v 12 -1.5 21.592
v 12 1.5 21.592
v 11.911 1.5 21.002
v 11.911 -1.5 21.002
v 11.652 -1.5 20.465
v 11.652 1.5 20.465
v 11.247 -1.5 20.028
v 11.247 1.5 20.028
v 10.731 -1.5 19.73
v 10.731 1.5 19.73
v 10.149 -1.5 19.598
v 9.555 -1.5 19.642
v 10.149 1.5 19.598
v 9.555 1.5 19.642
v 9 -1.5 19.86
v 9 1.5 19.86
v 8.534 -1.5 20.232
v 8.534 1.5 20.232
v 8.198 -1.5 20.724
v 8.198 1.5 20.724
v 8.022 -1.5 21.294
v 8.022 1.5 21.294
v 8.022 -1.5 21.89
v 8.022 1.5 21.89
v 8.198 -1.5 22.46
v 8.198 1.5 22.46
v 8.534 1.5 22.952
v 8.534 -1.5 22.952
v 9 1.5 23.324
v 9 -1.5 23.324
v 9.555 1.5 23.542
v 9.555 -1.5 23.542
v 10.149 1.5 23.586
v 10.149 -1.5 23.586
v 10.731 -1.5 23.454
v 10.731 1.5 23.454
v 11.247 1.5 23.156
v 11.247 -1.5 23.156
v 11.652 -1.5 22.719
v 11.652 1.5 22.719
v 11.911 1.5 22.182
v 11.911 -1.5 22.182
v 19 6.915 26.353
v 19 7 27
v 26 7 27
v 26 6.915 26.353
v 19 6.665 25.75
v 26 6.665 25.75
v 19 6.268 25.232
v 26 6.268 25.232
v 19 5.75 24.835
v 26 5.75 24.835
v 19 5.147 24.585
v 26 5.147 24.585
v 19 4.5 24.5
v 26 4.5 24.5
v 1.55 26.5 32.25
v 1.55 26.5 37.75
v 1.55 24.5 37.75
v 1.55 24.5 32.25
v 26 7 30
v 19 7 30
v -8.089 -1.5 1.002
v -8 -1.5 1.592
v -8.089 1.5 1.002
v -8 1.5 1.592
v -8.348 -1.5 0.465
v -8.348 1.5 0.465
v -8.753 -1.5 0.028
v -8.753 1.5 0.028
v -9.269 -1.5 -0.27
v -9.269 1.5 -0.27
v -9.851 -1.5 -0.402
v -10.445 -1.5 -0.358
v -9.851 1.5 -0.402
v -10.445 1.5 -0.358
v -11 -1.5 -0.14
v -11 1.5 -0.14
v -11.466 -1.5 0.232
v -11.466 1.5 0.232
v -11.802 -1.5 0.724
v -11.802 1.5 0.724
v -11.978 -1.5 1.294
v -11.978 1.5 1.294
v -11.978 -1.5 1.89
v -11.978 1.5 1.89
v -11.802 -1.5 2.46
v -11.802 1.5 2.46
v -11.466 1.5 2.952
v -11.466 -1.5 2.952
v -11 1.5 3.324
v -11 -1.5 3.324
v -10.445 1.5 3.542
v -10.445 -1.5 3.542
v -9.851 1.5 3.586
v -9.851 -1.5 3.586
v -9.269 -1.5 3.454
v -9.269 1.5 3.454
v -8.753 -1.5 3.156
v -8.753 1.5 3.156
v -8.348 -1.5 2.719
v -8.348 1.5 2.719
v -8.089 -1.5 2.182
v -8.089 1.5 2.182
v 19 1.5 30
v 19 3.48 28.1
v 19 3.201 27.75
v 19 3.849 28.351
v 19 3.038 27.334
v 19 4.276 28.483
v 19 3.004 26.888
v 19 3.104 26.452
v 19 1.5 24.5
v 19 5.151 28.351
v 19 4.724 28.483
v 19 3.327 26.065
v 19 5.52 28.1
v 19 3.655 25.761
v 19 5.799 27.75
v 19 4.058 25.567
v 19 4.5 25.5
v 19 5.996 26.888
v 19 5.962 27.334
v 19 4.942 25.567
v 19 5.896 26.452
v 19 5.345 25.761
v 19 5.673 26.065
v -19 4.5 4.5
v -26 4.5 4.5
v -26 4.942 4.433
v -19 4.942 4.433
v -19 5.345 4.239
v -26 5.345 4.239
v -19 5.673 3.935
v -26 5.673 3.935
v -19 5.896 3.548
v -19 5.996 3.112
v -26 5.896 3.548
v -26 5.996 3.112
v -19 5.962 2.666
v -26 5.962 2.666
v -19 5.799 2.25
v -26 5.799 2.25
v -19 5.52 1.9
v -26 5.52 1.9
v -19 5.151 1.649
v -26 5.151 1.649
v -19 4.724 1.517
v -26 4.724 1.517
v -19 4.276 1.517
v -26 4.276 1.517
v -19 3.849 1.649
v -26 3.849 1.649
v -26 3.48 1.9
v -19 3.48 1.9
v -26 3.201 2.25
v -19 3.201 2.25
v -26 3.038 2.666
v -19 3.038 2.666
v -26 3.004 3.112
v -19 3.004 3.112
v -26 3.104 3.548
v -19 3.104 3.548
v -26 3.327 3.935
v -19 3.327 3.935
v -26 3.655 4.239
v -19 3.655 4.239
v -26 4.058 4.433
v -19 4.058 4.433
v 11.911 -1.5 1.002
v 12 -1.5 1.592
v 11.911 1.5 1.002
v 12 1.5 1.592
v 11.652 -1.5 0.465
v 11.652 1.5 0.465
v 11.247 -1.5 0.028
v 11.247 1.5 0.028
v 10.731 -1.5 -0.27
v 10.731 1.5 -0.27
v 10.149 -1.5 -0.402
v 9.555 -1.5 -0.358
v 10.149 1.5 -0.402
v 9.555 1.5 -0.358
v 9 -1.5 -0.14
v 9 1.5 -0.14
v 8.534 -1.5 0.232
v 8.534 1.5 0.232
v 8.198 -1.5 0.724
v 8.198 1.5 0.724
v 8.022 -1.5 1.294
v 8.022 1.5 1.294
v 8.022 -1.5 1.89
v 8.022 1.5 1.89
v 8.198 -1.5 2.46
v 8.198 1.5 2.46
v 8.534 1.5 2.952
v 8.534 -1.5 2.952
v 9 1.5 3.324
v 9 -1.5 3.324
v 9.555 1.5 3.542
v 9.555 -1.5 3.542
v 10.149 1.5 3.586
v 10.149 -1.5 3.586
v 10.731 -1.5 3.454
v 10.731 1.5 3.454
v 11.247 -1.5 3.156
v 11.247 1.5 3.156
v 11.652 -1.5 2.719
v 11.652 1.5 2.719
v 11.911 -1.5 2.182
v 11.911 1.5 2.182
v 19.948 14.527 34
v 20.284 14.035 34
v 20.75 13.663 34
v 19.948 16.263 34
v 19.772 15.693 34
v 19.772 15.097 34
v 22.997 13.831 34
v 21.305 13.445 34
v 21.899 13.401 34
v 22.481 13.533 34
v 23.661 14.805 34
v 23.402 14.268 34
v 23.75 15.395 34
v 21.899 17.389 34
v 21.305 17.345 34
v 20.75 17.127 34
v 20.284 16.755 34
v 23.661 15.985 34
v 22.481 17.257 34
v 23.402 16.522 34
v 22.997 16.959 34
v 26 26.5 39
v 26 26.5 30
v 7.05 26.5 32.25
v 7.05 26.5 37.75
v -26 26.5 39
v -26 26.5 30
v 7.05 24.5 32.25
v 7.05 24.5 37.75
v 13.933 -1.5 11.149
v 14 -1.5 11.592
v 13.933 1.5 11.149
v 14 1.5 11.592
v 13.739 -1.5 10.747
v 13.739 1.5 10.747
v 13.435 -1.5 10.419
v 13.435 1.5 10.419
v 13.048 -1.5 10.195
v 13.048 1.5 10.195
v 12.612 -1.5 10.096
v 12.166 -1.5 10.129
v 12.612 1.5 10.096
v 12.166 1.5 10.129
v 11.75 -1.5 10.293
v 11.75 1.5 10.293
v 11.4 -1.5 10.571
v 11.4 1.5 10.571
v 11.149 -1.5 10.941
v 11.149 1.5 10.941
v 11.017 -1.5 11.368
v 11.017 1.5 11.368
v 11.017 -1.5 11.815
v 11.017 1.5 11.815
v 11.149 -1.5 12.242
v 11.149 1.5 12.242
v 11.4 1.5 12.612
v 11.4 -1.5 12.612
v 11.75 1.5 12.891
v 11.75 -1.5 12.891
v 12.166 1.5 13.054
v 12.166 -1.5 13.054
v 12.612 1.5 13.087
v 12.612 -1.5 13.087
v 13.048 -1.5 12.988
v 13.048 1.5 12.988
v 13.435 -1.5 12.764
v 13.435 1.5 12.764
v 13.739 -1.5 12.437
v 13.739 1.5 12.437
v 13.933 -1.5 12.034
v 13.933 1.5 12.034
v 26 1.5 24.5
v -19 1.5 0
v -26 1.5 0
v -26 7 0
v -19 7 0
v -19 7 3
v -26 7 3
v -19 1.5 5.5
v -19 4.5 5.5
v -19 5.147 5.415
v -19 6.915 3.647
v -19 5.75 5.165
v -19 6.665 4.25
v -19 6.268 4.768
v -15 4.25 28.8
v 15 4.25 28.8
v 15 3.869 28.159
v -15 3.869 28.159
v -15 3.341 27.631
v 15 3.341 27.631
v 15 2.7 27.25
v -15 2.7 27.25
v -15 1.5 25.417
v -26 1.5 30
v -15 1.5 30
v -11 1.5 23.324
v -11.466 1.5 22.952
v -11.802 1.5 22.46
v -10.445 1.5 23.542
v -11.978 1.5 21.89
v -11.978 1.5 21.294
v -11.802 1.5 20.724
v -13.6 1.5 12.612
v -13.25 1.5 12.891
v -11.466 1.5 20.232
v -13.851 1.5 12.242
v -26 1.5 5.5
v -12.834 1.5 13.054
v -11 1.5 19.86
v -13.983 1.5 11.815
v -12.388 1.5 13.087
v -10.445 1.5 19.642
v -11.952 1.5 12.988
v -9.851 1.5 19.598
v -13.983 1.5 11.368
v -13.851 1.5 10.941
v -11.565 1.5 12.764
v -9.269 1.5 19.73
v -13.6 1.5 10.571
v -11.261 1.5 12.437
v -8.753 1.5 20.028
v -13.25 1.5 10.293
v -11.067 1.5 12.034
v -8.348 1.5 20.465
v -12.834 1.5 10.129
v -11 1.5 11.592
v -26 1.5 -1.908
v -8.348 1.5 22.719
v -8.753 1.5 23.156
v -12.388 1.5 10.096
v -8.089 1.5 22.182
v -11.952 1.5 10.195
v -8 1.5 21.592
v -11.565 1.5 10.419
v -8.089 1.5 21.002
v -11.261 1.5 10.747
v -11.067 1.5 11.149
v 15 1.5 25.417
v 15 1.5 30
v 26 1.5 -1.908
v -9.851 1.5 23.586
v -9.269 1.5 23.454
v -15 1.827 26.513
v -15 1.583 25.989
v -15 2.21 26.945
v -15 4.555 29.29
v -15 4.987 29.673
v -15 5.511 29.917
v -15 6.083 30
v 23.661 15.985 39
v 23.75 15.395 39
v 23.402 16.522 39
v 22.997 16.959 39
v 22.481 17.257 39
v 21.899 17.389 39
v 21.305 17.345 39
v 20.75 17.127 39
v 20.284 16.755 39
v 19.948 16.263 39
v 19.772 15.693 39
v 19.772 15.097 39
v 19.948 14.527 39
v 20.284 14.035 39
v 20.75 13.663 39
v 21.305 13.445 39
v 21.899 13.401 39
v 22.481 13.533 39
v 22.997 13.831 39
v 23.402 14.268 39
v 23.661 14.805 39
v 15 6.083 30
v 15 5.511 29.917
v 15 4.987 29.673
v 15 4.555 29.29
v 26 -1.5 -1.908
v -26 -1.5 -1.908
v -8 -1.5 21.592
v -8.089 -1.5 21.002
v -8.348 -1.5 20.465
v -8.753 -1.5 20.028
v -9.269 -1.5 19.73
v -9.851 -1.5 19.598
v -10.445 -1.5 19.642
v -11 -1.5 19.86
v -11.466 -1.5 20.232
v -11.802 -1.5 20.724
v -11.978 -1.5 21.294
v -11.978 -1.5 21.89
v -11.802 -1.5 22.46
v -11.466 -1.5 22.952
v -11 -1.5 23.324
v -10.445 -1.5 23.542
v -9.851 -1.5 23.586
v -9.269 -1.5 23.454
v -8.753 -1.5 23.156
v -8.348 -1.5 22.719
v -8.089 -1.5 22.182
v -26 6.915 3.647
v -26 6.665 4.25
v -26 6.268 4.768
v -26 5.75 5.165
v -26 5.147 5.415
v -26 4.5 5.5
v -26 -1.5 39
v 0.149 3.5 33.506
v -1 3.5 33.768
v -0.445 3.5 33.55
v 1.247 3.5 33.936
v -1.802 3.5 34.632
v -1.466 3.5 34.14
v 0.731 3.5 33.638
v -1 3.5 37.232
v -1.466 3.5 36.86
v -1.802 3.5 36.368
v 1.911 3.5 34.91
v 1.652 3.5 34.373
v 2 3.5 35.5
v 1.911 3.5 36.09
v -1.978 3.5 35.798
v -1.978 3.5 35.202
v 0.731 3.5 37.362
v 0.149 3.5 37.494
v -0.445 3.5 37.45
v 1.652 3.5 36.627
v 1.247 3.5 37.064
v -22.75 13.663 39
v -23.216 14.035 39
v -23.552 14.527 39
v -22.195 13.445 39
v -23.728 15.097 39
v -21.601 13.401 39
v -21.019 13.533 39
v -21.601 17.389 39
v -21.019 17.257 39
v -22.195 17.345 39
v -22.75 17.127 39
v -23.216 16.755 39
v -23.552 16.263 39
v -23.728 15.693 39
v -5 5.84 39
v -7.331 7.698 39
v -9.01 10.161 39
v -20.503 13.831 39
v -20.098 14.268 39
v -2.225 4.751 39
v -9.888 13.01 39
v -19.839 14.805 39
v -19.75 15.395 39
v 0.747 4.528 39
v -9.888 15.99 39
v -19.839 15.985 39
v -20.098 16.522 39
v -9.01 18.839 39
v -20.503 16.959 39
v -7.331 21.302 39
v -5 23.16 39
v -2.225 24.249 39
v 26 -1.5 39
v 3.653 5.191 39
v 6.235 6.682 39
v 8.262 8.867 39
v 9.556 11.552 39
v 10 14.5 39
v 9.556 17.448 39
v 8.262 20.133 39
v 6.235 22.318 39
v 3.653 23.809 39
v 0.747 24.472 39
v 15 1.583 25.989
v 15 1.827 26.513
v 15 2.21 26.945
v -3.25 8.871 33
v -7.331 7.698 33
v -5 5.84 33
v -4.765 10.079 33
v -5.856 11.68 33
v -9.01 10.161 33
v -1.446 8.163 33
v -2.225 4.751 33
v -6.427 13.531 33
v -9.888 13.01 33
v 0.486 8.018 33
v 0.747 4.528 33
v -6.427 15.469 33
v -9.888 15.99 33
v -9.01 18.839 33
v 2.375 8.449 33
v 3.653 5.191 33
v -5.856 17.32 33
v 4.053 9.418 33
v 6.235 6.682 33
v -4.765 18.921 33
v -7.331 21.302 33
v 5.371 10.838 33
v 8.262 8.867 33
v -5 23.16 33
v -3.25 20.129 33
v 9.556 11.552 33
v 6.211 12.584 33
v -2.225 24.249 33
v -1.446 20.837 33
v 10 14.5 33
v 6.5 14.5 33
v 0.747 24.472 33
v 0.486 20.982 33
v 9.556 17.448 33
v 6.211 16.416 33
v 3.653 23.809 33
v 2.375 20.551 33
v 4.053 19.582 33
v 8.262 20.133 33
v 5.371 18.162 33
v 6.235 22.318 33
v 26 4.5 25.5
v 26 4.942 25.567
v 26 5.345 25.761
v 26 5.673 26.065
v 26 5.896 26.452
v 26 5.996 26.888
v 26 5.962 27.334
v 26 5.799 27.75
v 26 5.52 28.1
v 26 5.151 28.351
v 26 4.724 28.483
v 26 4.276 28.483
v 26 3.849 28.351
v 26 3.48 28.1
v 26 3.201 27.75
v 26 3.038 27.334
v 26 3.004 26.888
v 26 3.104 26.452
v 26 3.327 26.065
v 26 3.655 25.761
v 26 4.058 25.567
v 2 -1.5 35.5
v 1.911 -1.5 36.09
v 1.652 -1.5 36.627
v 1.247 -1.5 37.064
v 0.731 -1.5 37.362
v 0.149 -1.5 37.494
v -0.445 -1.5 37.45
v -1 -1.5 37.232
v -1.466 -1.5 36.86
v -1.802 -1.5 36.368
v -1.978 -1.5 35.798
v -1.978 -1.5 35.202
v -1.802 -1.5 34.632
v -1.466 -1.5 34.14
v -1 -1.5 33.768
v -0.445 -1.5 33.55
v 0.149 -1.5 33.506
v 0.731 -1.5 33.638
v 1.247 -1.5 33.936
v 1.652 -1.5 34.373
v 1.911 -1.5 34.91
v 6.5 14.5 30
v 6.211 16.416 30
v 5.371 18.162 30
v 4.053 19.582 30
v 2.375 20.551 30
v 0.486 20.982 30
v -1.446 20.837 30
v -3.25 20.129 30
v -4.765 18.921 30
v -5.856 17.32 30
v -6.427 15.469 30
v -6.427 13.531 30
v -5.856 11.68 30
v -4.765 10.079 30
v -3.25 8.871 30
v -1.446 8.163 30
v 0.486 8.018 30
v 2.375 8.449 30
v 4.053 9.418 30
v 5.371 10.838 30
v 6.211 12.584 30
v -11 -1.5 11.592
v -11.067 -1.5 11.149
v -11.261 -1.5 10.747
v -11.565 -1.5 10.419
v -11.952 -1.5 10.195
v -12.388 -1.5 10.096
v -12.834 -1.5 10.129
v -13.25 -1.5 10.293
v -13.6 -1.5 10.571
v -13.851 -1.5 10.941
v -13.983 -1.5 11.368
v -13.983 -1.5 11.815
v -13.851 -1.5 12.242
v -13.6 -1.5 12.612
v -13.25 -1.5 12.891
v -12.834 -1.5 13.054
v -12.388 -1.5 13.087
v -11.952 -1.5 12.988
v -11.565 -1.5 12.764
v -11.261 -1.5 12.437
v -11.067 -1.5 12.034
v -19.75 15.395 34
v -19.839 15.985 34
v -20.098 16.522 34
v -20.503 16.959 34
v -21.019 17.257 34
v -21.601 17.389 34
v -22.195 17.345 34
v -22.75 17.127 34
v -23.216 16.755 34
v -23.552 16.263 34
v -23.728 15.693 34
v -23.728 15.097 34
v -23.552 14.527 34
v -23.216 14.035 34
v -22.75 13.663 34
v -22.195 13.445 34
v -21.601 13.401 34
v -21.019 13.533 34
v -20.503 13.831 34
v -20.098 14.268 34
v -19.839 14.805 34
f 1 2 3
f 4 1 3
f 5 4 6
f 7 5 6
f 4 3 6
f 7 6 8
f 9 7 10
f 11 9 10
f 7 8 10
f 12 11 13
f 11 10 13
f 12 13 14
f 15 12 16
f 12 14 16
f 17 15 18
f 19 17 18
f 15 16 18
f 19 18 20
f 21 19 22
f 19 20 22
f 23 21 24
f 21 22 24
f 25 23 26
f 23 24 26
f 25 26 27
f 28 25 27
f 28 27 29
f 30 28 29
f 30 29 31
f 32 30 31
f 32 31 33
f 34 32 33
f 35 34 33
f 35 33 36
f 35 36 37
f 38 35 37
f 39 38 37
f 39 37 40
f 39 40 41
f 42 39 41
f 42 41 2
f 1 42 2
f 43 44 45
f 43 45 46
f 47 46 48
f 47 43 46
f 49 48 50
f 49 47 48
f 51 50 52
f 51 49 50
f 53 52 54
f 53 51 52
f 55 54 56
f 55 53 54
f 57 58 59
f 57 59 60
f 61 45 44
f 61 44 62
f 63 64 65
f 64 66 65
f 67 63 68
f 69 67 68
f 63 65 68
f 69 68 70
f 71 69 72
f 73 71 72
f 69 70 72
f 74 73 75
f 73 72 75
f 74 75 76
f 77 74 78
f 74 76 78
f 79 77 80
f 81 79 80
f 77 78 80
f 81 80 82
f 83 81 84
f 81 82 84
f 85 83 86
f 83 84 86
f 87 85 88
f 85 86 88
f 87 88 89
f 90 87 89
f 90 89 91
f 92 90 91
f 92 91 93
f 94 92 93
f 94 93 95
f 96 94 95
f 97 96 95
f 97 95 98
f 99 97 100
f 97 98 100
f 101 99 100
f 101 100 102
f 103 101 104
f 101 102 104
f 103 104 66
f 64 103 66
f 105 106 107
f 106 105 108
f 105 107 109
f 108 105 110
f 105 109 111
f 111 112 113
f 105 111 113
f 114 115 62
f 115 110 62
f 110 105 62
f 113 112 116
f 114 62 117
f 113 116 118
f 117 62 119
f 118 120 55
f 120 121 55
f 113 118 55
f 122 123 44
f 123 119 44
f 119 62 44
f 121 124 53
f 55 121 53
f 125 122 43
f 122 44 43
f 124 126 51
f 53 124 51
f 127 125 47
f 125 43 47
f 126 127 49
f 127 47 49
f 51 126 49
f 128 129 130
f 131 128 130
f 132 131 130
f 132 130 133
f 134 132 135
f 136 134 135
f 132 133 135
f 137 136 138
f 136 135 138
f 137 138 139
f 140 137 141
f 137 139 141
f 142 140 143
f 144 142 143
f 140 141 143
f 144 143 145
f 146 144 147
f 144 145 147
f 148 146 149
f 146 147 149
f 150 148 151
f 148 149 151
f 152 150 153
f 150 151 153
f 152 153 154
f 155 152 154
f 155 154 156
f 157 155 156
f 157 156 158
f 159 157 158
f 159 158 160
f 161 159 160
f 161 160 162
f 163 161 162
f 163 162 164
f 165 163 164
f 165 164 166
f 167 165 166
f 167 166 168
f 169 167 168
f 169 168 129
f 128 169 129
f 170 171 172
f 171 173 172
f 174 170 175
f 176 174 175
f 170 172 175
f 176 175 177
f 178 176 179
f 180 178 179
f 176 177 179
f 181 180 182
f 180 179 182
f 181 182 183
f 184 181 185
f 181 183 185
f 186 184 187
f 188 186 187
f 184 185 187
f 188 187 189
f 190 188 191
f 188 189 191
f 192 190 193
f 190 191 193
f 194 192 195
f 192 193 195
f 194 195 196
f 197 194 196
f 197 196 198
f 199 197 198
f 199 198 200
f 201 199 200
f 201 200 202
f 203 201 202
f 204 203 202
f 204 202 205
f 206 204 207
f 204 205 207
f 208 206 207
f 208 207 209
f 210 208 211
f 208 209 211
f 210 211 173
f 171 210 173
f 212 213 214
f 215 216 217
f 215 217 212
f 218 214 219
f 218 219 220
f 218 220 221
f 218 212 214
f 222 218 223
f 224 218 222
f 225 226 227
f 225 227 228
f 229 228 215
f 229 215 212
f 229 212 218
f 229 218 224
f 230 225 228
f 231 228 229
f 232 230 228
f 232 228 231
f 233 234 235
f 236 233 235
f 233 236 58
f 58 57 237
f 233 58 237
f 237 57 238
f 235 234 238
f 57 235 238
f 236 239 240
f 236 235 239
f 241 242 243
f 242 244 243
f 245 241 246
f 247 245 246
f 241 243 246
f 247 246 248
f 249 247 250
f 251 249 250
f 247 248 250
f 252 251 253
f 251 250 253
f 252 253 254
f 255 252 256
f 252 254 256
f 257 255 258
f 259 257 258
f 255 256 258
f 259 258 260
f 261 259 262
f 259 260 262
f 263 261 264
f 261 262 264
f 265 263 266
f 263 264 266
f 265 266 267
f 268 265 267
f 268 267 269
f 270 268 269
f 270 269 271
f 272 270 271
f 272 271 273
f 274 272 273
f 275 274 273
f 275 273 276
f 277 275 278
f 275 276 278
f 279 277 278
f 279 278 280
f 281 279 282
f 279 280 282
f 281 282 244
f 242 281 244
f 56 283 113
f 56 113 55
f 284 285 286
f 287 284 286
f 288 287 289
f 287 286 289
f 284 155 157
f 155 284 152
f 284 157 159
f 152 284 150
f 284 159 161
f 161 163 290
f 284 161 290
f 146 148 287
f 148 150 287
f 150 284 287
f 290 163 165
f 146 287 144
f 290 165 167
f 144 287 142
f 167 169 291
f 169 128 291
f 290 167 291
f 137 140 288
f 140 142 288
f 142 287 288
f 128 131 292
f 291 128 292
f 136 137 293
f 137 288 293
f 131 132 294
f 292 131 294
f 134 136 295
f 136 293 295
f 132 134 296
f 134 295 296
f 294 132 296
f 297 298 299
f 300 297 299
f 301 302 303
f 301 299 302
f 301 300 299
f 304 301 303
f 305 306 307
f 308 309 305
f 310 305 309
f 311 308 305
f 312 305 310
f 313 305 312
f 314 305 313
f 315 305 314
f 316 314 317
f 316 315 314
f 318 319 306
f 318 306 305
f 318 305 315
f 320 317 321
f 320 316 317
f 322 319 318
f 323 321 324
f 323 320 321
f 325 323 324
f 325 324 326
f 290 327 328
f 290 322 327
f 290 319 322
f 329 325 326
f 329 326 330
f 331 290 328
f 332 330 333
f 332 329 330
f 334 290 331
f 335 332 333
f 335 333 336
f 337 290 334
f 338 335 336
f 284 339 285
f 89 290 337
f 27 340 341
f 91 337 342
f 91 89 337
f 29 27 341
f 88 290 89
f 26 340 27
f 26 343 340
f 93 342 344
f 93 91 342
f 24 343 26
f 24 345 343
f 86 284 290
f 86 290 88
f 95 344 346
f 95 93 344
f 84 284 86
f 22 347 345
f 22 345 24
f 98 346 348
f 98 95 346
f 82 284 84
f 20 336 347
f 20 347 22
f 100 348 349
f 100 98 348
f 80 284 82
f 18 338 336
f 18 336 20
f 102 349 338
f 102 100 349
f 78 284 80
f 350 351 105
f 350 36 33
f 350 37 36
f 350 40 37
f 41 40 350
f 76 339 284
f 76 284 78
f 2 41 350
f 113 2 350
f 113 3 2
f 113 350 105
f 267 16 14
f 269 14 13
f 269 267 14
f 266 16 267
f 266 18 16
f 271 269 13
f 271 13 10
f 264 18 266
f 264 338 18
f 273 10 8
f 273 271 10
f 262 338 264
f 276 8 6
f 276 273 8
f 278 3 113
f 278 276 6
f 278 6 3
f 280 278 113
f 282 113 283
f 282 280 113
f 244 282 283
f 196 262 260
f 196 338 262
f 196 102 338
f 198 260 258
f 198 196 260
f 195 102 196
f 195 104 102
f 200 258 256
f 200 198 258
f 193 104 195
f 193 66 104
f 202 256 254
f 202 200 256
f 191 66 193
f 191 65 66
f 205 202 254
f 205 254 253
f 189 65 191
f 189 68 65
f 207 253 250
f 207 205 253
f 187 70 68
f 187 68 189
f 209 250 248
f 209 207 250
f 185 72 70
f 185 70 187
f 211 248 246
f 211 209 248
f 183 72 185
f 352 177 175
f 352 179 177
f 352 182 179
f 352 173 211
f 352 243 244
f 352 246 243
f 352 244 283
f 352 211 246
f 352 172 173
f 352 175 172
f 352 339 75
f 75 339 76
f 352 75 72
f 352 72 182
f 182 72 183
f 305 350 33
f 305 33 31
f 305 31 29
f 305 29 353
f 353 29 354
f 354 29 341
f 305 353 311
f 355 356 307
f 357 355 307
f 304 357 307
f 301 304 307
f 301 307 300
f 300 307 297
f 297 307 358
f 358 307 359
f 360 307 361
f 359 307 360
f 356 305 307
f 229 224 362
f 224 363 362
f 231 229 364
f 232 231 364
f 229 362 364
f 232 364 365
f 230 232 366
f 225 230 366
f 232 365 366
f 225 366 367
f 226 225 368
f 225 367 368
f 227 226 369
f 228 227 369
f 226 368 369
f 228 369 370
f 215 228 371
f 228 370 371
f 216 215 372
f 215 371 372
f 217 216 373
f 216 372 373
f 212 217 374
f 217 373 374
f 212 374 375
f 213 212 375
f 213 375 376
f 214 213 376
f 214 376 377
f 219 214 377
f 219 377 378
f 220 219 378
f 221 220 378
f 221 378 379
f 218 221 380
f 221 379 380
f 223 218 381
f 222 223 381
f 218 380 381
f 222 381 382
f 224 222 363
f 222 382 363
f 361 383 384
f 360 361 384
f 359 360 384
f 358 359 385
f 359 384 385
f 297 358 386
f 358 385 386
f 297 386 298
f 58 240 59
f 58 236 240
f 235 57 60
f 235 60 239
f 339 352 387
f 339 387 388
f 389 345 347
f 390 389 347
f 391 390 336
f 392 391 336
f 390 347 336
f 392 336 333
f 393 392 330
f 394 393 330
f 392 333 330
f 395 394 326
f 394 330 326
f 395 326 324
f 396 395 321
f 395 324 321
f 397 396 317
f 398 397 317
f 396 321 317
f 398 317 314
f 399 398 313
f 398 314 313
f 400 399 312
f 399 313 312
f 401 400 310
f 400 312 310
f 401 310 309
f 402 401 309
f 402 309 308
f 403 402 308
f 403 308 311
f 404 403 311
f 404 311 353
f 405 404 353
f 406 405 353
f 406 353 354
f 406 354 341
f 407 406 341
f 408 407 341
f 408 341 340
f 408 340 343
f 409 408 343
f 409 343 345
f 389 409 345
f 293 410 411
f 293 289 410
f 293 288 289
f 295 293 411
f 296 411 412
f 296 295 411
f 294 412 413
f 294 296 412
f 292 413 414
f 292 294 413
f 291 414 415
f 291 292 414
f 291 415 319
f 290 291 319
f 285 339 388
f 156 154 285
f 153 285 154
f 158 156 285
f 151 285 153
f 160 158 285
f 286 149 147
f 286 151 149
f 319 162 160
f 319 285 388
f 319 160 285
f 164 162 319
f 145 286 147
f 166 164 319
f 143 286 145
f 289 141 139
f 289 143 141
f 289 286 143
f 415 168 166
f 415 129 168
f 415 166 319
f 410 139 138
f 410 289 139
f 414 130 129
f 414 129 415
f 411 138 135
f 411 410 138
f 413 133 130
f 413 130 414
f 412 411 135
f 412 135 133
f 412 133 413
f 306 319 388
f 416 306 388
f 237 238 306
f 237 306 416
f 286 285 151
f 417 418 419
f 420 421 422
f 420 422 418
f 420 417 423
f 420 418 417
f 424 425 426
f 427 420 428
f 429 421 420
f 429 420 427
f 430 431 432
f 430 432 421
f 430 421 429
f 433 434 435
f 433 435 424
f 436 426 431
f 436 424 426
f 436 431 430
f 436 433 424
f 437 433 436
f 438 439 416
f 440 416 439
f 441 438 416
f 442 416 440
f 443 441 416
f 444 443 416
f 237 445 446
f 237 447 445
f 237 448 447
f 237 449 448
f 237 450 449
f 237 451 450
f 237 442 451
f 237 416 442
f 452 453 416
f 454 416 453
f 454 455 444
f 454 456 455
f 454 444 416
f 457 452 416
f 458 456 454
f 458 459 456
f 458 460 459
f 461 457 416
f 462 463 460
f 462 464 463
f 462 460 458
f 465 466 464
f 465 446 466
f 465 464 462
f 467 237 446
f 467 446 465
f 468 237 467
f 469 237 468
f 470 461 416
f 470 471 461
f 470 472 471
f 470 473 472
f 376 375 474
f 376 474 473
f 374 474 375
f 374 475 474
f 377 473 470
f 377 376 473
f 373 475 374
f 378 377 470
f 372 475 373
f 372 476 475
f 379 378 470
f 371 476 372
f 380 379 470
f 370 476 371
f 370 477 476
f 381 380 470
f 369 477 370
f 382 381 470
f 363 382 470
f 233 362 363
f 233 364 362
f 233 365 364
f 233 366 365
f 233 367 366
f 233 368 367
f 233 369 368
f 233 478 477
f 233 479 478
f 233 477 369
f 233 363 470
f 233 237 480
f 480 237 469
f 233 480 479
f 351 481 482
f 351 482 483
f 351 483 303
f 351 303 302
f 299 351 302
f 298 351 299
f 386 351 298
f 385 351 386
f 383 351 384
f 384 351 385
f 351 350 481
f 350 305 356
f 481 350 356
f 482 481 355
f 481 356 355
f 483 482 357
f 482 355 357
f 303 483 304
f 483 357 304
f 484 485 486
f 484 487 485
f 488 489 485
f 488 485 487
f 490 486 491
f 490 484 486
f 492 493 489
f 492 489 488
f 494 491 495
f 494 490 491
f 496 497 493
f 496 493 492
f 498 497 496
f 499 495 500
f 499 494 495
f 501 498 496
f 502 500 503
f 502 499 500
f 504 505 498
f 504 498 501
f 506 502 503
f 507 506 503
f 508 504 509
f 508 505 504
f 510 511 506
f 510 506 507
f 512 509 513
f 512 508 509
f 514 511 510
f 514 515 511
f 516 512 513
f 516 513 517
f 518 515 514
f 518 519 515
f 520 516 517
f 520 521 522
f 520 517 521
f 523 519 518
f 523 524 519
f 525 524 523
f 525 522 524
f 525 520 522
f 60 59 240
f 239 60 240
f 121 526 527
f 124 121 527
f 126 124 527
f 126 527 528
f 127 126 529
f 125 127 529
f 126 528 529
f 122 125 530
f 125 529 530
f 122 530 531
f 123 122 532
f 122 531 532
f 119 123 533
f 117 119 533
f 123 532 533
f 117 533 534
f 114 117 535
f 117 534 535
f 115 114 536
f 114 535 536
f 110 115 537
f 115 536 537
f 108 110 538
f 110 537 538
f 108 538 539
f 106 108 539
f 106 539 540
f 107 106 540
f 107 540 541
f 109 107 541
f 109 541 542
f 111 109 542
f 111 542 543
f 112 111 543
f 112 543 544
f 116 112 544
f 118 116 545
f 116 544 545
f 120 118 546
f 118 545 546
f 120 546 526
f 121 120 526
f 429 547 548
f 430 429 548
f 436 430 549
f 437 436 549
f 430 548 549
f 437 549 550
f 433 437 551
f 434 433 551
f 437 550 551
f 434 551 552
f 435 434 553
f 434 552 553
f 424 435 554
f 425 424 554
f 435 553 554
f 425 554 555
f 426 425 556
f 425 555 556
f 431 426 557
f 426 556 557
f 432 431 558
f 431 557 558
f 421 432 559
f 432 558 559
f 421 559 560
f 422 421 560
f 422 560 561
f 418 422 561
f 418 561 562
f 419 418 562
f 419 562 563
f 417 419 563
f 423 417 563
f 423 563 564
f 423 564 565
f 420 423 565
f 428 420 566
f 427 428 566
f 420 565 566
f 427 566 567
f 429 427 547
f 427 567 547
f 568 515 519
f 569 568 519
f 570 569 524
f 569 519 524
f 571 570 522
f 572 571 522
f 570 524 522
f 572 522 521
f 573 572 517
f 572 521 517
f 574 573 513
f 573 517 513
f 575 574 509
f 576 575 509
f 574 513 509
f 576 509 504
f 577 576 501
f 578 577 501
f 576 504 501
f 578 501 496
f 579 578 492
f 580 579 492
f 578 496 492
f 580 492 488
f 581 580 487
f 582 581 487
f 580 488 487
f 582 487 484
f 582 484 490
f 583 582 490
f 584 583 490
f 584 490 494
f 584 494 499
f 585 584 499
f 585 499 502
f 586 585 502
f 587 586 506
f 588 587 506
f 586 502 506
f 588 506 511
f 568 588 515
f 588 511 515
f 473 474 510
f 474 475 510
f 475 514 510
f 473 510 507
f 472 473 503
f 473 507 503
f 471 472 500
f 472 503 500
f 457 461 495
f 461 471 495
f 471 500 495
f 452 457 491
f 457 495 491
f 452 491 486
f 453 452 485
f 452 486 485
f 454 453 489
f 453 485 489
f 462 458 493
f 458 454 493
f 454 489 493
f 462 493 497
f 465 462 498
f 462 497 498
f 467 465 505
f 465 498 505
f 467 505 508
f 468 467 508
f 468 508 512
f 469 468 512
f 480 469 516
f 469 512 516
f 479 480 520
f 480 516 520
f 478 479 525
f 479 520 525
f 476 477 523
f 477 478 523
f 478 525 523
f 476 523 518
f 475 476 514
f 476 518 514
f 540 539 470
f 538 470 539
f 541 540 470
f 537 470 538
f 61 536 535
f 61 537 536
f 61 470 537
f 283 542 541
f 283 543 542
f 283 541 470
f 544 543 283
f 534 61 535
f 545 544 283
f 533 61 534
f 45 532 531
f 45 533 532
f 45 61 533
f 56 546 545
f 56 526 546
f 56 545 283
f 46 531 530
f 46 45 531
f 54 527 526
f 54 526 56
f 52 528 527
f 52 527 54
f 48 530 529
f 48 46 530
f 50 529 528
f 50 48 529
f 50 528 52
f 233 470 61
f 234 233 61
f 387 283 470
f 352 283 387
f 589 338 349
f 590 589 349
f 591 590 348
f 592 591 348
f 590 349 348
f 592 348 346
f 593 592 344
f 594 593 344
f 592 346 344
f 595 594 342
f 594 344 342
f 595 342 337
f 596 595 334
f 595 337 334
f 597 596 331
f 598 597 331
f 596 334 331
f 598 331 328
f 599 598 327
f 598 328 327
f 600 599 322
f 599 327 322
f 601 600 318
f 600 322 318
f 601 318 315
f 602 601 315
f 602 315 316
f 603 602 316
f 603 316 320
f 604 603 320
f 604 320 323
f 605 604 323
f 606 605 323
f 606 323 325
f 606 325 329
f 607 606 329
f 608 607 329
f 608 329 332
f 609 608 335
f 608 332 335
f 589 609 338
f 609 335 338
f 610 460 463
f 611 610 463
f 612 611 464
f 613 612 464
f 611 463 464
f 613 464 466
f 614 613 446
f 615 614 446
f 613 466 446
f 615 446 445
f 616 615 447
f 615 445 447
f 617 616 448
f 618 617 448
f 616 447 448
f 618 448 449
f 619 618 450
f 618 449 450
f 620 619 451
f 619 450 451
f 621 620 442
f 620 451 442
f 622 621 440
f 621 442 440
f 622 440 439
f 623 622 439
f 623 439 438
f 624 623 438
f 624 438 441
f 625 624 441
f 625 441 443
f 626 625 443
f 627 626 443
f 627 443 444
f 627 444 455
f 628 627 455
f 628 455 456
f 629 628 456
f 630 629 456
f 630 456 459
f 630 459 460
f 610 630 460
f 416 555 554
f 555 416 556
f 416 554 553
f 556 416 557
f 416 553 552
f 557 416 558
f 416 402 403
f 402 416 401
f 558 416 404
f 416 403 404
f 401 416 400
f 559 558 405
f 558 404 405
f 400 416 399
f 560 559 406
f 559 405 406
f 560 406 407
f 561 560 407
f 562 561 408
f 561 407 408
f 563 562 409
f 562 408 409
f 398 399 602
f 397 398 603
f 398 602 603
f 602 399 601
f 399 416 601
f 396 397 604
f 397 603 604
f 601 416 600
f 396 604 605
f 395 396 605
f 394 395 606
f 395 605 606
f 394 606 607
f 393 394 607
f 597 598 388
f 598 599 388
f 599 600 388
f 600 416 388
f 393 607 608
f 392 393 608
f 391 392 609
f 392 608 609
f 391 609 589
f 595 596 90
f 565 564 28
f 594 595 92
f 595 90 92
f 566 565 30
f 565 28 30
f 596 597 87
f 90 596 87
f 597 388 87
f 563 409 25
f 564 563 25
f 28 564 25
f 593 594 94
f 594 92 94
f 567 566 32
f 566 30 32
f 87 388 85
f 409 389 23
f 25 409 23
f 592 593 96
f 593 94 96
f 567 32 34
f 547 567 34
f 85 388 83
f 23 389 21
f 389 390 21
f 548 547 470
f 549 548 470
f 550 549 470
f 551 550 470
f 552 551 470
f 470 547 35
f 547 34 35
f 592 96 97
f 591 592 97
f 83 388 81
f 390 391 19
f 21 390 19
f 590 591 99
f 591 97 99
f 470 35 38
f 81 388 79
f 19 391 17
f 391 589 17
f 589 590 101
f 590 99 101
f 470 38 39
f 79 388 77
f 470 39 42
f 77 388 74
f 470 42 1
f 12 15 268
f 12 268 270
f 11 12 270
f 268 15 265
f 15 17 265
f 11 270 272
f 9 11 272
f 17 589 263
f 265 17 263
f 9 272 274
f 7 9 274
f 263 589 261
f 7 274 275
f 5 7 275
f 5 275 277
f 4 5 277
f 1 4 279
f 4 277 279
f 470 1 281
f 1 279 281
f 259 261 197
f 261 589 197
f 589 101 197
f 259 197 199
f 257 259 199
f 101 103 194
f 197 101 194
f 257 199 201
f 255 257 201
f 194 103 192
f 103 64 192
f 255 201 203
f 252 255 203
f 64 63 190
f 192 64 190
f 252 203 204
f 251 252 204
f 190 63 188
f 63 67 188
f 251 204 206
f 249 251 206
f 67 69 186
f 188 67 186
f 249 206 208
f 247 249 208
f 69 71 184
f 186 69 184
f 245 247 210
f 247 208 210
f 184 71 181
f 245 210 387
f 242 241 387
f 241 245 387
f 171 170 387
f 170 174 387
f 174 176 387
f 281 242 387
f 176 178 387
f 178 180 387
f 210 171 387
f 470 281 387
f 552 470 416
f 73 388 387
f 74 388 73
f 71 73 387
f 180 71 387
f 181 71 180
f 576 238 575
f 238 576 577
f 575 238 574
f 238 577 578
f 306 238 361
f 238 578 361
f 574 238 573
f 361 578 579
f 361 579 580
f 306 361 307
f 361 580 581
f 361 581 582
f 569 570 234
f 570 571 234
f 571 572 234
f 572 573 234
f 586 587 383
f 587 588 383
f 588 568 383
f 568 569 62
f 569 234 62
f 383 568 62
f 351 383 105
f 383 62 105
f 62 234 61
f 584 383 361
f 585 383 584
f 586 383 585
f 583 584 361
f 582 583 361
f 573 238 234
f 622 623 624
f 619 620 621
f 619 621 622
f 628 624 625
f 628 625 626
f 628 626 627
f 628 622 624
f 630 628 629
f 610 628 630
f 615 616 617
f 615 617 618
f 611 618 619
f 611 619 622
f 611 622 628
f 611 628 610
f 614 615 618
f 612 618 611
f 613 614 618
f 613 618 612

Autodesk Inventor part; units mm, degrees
ref_plane "YZ Plane" through (0, 0, 0) normal (1, 0, 0) x (0, 1, 0)
ref_plane "XZ Plane" through (0, 0, 0) normal (0, 1, 0) x (-1, 0, 0)
ref_plane "XY Plane" through (0, 0, 0) normal (0, 0, 1) x (1, 0, 0)
sketch "Boceto1" plane through (0, 0, 0) normal (0, 0, 1) x (1, 0, 0)
  line L0 (-26, 1.5) -> (26, 1.5)
  line L1 (26, 1.5) -> (26, -1.5)
  line L2 (26, -1.5) -> (-26, -1.5)
  line L3 (-26, -1.5) -> (-26, 1.5)
  line L4 (2.9301, 0) -> (0, 0)
  line L5 (0, 0) -> (0, 1.8389)
  dimension "d0" = 52
  dimension "d1" = 3
extrude "Extrusión1" add sketch "Boceto1" along normal blind 30
sketch "Boceto3" plane through (-26, 1.5, 0) normal (0, 1, 0) x (1, 0, 0)
  line L0 (52, 0) -> (52, -30) projected
  line L1 (0, -30) -> (52, -30) projected
  line L2 (52, 0) -> (47, 0)
  line L3 (47, 0) -> (47, -30)
  line L4 (47, -30) -> (52, -30)
  line L5 (52, -30) -> (52, 0)
  line L6 (0, 0) -> (0, -30) projected
  line L7 (0, 0) -> (5, 0)
  line L8 (5, 0) -> (5, -30)
  line L9 (5, -30) -> (0, -30)
  line L10 (0, -30) -> (0, 0)
  point P0 (26, 0)
  point P1 (5, -30)
  dimension "d4" = 5
  dimension "d5" = 5
extrude "Extrusión2" add sketch "Boceto3" along normal blind 25
sketch "Boceto5" plane through (0, 0, 30) normal (0, 0, 1) x (1, 0, 0)
  line L0 (-26, -1.5) -> (26, -1.5) projected
  line L1 (-26, -1.5) -> (-26, 26.5) projected
  line L2 (26, -1.5) -> (-26, -1.5)
  line L3 (-26, -1.5) -> (-26, 26.5)
  line L4 (-26, 26.5) -> (26, 26.5)
  line L5 (26, 26.5) -> (26, -1.5)
  point P0 (0, 0)
extrude "Extrusión4" add sketch "Boceto5" along normal blind 3
sketch "Boceto6" plane through (0, 0, 33) normal (0, 0, 1) x (1, 0, 0)
  circle A0 centre (0, 14.5) radius 6.5
  line L0 (26, -1.5) -> (26, 26.5) projected
  line L1 (26, 26.5) -> (-26, 26.5) projected
  line L2 (-26, 26.5) -> (-26, -1.5) projected
  point P0 (0, 0)
  point P1 (2.0533, 26.5)
  point P2 (-6.2533, 26.5)
  dimension "d12" = 13
  dimension "d13" = 26
  dimension "d14" = 12
  dimension "d38" = 52
extrude "Extrusión5" cut sketch "Boceto6" against normal up to surface (3 mm away)
sketch "Boceto7" plane through (-21, 1.5, 0) normal (0, 1, 0) x (1, 0, 0)
  circle A0 centre (33.5, -11.5916) radius 1.5
  circle A1 centre (8.5, -11.5916) radius 1.5
  line L0 (21, 0) -> (21, -4.282)
  line L1 (47, -33) -> (-5, -33) projected
  dimension "d17" = 25
  dimension "d18" = 12.5
  dimension "d19" = 3
  dimension "d20" = 3
  dimension "d68" = 21.4084
extrude "Extrusión6" cut sketch "Boceto7" against normal through all
sketch "Boceto9" plane through (0, 0, 33) normal (0, 0, 1) x (1, 0, 0)
  circle A0 centre (0, 14.5) radius 6.5 projected
  line L0 (-26, 26.5) -> (-26, -1.5) projected
  line L1 (26, 26.5) -> (-26, 26.5) projected
  line L2 (26, -1.5) -> (26, 26.5) projected
  line L3 (-26, -1.5) -> (26, -1.5) projected
  circle A1 centre (0, 14.5) radius 10
  point P0 (0, 0)
  point P1 (0, 26.5)
  dimension "d32" = 20
extrude "Extrusión8" add sketch "Boceto9" along normal blind 6 contours L1 L2 L3 L0
sketch "Boceto8" plane through (0, 0, 39) normal (0, 0, 1) x (1, 0, 0)
  circle A0 centre (21.75, 15.395) radius 2
  circle A1 centre (-21.75, 15.395) radius 2
  line L0 (26, 26.5) -> (-26, 26.5) projected
  circle A2 centre (0, 14.5) radius 10 projected
  point P0 (0, 0)
  dimension "d23" = 4
  dimension "d24" = 4
  dimension "d25" = 43.5
  dimension "d35" = 11.105
  dimension "d36" = 11.105
  dimension "d37" = 21.75
extrude "Extrusión7" cut sketch "Boceto8" against normal blind 5 contours A0 | A1
sketch "Boceto10" plane through (-26, 26.5, 0) normal (0, 1, 0) x (1, 0, 0)
  circle A0 centre (30.3, -35) radius 2
  line L0 (52, 0) -> (52, -39) projected
  line L1 (52, -39) -> (0, -39) projected
  line L2 (27.55, -32.25) -> (33.05, -32.25)
  line L3 (33.05, -32.25) -> (33.05, -37.75)
  line L4 (33.05, -37.75) -> (27.55, -37.75)
  line L5 (27.55, -37.75) -> (27.55, -32.25)
  line L6 (27.55, -32.25) -> (33.05, -37.75) construction
  line L7 (33.05, -32.25) -> (27.55, -37.75) construction
  point P0 (26, 0)
  dimension "d39" = 21.7
  dimension "d41" = 4
  dimension "d45" = 5.5
  dimension "d46" = 5.5
extrude "Extrusión9" cut sketch "Boceto10" against normal blind 2 contours A0 | L2 L3 L4 L5
sketch "Boceto11" plane through (26, -1.5, 0) normal (1, 0, 0) x (0, 0, -1)
  line L0 (-30, 28) -> (0, 28) projected
  line L1 (0, 28) -> (-30, 28)
  line L2 (-30, 28) -> (-30, 3)
  line L3 (-30, 3) -> (0, 3)
  line L4 (0, 3) -> (0, 28)
  point P0 (0, 1.5)
  dimension "d47" = 30
  dimension "d48" = 25
extrude "Extrusión10" cut sketch "Boceto11" against normal up to surface (52 mm away)
sketch "Boceto12" plane through (-26, -1.5, 0) normal (0, -1, 0) x (1, 0, 0)
  circle A0 centre (26, 35.5) radius 2
  line L0 (0, 0) -> (0, 39) projected
  line L1 (52, 0) -> (52, 39) projected
  line L2 (0, 39) -> (52, 39) projected
  point P0 (26, 0)
  dimension "d51" = 4
  dimension "d52" = 52
  dimension "d53" = 26
  dimension "d54" = 3.5
extrude "Extrusión11" cut sketch "Boceto12" against normal blind 5
sketch "Boceto13" plane through (26, -1.5, 0) normal (1, 0, 0) x (0, 0, -1)
  line L0 (-30, 3) -> (0, 3) projected
  line L1 (-24.5, 3) -> (-24.5, 8.5)
  line L2 (-24.5, 3) -> (-19, 3) construction
  line L3 (-24.5, 8.5) -> (-30, 8.5)
  line L4 (-30, 3) -> (-30, 28) projected
  circle A0 centre (-27, 6) radius 1.5
  point P0 (0, 1.5)
  dimension "d57" = 5.5
  dimension "d58" = 90
  dimension "d59" = 5.5
  dimension "d63" = 3
  dimension "d64" = 3
  dimension "d65" = 3
extrude "Extrusión12" add sketch "Boceto13" against normal blind 7
fillet "Empalme2" radius 2.5 1 edges at (22.5, 7, 24.5)
sketch "Boceto16" plane through (-26, 1.5, 0) normal (0, 1, 0) x (1, 0, 0)
  line L0 (0, -30) -> (0, 0) projected
  line L1 (0, 0) -> (52, 0)
  line L2 (52, 0) -> (52, 1.908)
  line L3 (52, 1.908) -> (0, 1.908)
  line L4 (0, 1.908) -> (0, 0)
  line L5 (52, 0) -> (52, -24.5) projected
  point P0 (26, 0)
  dimension "d69" = 1.908
extrude "Extrusión13" add sketch "Boceto16" against normal up to surface (3 mm away)
sketch "Boceto17" plane through (-26, 1.5, 30) normal (0, 1, 0) x (1, 0, 0)
  circle A0 centre (16, 28.408) radius 2
  line L0 (52, 31.908) -> (0, 31.908) projected
  point P0 (26, 30)
  dimension "d72" = 4
  dimension "d73" = 3.5
  dimension "d82" = 10
extrude "Extrusión14" cut sketch "Boceto17" against normal through all
pattern_linear "Patrón rectangular1" count 2 spacing 20 along (1, 0, 0) count 2 spacing 20 along (0, 0, 1) of "Extrusión14"
sketch "Boceto18" plane through (0, 0, 0) normal (1, 0, 0) x (0, 1, 0)
  line L0 (26.5, 30) -> (1.5, 30) projected
  line L1 (1.5, -1.908) -> (1.5, 30) projected
  arc A0 (1.5, 27) -> (4.5, 30) centre (1.5, 30) ccw
  point P0 (0, 0)
  point P1 (4.5, 30)
  dimension "d83" = 3
extrude "Extrusión15" add sketch "Boceto18" along normal mid plane 30
fillet "Empalme3" radius 2 2 edges at (0, 1.5, 27) (0, 4.5, 30)
sketch "Boceto19" plane through (-26, 1.5, 30) normal (-1, 0, 0) x (0, 0, 1)
  line L0 (-5.5, 0) -> (-31.908, 0) projected
  line L1 (-24.5, 0) -> (-30, 0)
  line L2 (-30, 0) -> (-30, 5.5)
  line L3 (-30, 5.5) -> (-24.5, 5.5)
  line L4 (-24.5, 5.5) -> (-24.5, 0)
  line L5 (0, 25) -> (0, 0) projected
  circle A0 centre (-27, 3) radius 1.5
  point P0 (-30, -1.5)
  point P1 (-30, 0)
  dimension "d87" = 5.5
  dimension "d88" = 5.5
  dimension "d89" = 24.5
  dimension "d93" = 3
  dimension "d94" = 3
  dimension "d95" = 2.5
extrude "Extrusión16" add sketch "Boceto19" against normal blind 7
fillet "Empalme4" radius 2.5 1 edges at (-22.5, 7, 5.5)
equation "\"d13\" = 0.5 * d38"
equation "\"d18\" = 0.5 * d17"
equation "\"d20\" = d19"
equation "\"d24\" = d23"
equation "\"d36\" = d35"
equation "\"d53\" = 0.5 * d52"
equation "\"d59\" = d57"
properties part number "Soporte Extruder Izq" material "Polipropileno"
